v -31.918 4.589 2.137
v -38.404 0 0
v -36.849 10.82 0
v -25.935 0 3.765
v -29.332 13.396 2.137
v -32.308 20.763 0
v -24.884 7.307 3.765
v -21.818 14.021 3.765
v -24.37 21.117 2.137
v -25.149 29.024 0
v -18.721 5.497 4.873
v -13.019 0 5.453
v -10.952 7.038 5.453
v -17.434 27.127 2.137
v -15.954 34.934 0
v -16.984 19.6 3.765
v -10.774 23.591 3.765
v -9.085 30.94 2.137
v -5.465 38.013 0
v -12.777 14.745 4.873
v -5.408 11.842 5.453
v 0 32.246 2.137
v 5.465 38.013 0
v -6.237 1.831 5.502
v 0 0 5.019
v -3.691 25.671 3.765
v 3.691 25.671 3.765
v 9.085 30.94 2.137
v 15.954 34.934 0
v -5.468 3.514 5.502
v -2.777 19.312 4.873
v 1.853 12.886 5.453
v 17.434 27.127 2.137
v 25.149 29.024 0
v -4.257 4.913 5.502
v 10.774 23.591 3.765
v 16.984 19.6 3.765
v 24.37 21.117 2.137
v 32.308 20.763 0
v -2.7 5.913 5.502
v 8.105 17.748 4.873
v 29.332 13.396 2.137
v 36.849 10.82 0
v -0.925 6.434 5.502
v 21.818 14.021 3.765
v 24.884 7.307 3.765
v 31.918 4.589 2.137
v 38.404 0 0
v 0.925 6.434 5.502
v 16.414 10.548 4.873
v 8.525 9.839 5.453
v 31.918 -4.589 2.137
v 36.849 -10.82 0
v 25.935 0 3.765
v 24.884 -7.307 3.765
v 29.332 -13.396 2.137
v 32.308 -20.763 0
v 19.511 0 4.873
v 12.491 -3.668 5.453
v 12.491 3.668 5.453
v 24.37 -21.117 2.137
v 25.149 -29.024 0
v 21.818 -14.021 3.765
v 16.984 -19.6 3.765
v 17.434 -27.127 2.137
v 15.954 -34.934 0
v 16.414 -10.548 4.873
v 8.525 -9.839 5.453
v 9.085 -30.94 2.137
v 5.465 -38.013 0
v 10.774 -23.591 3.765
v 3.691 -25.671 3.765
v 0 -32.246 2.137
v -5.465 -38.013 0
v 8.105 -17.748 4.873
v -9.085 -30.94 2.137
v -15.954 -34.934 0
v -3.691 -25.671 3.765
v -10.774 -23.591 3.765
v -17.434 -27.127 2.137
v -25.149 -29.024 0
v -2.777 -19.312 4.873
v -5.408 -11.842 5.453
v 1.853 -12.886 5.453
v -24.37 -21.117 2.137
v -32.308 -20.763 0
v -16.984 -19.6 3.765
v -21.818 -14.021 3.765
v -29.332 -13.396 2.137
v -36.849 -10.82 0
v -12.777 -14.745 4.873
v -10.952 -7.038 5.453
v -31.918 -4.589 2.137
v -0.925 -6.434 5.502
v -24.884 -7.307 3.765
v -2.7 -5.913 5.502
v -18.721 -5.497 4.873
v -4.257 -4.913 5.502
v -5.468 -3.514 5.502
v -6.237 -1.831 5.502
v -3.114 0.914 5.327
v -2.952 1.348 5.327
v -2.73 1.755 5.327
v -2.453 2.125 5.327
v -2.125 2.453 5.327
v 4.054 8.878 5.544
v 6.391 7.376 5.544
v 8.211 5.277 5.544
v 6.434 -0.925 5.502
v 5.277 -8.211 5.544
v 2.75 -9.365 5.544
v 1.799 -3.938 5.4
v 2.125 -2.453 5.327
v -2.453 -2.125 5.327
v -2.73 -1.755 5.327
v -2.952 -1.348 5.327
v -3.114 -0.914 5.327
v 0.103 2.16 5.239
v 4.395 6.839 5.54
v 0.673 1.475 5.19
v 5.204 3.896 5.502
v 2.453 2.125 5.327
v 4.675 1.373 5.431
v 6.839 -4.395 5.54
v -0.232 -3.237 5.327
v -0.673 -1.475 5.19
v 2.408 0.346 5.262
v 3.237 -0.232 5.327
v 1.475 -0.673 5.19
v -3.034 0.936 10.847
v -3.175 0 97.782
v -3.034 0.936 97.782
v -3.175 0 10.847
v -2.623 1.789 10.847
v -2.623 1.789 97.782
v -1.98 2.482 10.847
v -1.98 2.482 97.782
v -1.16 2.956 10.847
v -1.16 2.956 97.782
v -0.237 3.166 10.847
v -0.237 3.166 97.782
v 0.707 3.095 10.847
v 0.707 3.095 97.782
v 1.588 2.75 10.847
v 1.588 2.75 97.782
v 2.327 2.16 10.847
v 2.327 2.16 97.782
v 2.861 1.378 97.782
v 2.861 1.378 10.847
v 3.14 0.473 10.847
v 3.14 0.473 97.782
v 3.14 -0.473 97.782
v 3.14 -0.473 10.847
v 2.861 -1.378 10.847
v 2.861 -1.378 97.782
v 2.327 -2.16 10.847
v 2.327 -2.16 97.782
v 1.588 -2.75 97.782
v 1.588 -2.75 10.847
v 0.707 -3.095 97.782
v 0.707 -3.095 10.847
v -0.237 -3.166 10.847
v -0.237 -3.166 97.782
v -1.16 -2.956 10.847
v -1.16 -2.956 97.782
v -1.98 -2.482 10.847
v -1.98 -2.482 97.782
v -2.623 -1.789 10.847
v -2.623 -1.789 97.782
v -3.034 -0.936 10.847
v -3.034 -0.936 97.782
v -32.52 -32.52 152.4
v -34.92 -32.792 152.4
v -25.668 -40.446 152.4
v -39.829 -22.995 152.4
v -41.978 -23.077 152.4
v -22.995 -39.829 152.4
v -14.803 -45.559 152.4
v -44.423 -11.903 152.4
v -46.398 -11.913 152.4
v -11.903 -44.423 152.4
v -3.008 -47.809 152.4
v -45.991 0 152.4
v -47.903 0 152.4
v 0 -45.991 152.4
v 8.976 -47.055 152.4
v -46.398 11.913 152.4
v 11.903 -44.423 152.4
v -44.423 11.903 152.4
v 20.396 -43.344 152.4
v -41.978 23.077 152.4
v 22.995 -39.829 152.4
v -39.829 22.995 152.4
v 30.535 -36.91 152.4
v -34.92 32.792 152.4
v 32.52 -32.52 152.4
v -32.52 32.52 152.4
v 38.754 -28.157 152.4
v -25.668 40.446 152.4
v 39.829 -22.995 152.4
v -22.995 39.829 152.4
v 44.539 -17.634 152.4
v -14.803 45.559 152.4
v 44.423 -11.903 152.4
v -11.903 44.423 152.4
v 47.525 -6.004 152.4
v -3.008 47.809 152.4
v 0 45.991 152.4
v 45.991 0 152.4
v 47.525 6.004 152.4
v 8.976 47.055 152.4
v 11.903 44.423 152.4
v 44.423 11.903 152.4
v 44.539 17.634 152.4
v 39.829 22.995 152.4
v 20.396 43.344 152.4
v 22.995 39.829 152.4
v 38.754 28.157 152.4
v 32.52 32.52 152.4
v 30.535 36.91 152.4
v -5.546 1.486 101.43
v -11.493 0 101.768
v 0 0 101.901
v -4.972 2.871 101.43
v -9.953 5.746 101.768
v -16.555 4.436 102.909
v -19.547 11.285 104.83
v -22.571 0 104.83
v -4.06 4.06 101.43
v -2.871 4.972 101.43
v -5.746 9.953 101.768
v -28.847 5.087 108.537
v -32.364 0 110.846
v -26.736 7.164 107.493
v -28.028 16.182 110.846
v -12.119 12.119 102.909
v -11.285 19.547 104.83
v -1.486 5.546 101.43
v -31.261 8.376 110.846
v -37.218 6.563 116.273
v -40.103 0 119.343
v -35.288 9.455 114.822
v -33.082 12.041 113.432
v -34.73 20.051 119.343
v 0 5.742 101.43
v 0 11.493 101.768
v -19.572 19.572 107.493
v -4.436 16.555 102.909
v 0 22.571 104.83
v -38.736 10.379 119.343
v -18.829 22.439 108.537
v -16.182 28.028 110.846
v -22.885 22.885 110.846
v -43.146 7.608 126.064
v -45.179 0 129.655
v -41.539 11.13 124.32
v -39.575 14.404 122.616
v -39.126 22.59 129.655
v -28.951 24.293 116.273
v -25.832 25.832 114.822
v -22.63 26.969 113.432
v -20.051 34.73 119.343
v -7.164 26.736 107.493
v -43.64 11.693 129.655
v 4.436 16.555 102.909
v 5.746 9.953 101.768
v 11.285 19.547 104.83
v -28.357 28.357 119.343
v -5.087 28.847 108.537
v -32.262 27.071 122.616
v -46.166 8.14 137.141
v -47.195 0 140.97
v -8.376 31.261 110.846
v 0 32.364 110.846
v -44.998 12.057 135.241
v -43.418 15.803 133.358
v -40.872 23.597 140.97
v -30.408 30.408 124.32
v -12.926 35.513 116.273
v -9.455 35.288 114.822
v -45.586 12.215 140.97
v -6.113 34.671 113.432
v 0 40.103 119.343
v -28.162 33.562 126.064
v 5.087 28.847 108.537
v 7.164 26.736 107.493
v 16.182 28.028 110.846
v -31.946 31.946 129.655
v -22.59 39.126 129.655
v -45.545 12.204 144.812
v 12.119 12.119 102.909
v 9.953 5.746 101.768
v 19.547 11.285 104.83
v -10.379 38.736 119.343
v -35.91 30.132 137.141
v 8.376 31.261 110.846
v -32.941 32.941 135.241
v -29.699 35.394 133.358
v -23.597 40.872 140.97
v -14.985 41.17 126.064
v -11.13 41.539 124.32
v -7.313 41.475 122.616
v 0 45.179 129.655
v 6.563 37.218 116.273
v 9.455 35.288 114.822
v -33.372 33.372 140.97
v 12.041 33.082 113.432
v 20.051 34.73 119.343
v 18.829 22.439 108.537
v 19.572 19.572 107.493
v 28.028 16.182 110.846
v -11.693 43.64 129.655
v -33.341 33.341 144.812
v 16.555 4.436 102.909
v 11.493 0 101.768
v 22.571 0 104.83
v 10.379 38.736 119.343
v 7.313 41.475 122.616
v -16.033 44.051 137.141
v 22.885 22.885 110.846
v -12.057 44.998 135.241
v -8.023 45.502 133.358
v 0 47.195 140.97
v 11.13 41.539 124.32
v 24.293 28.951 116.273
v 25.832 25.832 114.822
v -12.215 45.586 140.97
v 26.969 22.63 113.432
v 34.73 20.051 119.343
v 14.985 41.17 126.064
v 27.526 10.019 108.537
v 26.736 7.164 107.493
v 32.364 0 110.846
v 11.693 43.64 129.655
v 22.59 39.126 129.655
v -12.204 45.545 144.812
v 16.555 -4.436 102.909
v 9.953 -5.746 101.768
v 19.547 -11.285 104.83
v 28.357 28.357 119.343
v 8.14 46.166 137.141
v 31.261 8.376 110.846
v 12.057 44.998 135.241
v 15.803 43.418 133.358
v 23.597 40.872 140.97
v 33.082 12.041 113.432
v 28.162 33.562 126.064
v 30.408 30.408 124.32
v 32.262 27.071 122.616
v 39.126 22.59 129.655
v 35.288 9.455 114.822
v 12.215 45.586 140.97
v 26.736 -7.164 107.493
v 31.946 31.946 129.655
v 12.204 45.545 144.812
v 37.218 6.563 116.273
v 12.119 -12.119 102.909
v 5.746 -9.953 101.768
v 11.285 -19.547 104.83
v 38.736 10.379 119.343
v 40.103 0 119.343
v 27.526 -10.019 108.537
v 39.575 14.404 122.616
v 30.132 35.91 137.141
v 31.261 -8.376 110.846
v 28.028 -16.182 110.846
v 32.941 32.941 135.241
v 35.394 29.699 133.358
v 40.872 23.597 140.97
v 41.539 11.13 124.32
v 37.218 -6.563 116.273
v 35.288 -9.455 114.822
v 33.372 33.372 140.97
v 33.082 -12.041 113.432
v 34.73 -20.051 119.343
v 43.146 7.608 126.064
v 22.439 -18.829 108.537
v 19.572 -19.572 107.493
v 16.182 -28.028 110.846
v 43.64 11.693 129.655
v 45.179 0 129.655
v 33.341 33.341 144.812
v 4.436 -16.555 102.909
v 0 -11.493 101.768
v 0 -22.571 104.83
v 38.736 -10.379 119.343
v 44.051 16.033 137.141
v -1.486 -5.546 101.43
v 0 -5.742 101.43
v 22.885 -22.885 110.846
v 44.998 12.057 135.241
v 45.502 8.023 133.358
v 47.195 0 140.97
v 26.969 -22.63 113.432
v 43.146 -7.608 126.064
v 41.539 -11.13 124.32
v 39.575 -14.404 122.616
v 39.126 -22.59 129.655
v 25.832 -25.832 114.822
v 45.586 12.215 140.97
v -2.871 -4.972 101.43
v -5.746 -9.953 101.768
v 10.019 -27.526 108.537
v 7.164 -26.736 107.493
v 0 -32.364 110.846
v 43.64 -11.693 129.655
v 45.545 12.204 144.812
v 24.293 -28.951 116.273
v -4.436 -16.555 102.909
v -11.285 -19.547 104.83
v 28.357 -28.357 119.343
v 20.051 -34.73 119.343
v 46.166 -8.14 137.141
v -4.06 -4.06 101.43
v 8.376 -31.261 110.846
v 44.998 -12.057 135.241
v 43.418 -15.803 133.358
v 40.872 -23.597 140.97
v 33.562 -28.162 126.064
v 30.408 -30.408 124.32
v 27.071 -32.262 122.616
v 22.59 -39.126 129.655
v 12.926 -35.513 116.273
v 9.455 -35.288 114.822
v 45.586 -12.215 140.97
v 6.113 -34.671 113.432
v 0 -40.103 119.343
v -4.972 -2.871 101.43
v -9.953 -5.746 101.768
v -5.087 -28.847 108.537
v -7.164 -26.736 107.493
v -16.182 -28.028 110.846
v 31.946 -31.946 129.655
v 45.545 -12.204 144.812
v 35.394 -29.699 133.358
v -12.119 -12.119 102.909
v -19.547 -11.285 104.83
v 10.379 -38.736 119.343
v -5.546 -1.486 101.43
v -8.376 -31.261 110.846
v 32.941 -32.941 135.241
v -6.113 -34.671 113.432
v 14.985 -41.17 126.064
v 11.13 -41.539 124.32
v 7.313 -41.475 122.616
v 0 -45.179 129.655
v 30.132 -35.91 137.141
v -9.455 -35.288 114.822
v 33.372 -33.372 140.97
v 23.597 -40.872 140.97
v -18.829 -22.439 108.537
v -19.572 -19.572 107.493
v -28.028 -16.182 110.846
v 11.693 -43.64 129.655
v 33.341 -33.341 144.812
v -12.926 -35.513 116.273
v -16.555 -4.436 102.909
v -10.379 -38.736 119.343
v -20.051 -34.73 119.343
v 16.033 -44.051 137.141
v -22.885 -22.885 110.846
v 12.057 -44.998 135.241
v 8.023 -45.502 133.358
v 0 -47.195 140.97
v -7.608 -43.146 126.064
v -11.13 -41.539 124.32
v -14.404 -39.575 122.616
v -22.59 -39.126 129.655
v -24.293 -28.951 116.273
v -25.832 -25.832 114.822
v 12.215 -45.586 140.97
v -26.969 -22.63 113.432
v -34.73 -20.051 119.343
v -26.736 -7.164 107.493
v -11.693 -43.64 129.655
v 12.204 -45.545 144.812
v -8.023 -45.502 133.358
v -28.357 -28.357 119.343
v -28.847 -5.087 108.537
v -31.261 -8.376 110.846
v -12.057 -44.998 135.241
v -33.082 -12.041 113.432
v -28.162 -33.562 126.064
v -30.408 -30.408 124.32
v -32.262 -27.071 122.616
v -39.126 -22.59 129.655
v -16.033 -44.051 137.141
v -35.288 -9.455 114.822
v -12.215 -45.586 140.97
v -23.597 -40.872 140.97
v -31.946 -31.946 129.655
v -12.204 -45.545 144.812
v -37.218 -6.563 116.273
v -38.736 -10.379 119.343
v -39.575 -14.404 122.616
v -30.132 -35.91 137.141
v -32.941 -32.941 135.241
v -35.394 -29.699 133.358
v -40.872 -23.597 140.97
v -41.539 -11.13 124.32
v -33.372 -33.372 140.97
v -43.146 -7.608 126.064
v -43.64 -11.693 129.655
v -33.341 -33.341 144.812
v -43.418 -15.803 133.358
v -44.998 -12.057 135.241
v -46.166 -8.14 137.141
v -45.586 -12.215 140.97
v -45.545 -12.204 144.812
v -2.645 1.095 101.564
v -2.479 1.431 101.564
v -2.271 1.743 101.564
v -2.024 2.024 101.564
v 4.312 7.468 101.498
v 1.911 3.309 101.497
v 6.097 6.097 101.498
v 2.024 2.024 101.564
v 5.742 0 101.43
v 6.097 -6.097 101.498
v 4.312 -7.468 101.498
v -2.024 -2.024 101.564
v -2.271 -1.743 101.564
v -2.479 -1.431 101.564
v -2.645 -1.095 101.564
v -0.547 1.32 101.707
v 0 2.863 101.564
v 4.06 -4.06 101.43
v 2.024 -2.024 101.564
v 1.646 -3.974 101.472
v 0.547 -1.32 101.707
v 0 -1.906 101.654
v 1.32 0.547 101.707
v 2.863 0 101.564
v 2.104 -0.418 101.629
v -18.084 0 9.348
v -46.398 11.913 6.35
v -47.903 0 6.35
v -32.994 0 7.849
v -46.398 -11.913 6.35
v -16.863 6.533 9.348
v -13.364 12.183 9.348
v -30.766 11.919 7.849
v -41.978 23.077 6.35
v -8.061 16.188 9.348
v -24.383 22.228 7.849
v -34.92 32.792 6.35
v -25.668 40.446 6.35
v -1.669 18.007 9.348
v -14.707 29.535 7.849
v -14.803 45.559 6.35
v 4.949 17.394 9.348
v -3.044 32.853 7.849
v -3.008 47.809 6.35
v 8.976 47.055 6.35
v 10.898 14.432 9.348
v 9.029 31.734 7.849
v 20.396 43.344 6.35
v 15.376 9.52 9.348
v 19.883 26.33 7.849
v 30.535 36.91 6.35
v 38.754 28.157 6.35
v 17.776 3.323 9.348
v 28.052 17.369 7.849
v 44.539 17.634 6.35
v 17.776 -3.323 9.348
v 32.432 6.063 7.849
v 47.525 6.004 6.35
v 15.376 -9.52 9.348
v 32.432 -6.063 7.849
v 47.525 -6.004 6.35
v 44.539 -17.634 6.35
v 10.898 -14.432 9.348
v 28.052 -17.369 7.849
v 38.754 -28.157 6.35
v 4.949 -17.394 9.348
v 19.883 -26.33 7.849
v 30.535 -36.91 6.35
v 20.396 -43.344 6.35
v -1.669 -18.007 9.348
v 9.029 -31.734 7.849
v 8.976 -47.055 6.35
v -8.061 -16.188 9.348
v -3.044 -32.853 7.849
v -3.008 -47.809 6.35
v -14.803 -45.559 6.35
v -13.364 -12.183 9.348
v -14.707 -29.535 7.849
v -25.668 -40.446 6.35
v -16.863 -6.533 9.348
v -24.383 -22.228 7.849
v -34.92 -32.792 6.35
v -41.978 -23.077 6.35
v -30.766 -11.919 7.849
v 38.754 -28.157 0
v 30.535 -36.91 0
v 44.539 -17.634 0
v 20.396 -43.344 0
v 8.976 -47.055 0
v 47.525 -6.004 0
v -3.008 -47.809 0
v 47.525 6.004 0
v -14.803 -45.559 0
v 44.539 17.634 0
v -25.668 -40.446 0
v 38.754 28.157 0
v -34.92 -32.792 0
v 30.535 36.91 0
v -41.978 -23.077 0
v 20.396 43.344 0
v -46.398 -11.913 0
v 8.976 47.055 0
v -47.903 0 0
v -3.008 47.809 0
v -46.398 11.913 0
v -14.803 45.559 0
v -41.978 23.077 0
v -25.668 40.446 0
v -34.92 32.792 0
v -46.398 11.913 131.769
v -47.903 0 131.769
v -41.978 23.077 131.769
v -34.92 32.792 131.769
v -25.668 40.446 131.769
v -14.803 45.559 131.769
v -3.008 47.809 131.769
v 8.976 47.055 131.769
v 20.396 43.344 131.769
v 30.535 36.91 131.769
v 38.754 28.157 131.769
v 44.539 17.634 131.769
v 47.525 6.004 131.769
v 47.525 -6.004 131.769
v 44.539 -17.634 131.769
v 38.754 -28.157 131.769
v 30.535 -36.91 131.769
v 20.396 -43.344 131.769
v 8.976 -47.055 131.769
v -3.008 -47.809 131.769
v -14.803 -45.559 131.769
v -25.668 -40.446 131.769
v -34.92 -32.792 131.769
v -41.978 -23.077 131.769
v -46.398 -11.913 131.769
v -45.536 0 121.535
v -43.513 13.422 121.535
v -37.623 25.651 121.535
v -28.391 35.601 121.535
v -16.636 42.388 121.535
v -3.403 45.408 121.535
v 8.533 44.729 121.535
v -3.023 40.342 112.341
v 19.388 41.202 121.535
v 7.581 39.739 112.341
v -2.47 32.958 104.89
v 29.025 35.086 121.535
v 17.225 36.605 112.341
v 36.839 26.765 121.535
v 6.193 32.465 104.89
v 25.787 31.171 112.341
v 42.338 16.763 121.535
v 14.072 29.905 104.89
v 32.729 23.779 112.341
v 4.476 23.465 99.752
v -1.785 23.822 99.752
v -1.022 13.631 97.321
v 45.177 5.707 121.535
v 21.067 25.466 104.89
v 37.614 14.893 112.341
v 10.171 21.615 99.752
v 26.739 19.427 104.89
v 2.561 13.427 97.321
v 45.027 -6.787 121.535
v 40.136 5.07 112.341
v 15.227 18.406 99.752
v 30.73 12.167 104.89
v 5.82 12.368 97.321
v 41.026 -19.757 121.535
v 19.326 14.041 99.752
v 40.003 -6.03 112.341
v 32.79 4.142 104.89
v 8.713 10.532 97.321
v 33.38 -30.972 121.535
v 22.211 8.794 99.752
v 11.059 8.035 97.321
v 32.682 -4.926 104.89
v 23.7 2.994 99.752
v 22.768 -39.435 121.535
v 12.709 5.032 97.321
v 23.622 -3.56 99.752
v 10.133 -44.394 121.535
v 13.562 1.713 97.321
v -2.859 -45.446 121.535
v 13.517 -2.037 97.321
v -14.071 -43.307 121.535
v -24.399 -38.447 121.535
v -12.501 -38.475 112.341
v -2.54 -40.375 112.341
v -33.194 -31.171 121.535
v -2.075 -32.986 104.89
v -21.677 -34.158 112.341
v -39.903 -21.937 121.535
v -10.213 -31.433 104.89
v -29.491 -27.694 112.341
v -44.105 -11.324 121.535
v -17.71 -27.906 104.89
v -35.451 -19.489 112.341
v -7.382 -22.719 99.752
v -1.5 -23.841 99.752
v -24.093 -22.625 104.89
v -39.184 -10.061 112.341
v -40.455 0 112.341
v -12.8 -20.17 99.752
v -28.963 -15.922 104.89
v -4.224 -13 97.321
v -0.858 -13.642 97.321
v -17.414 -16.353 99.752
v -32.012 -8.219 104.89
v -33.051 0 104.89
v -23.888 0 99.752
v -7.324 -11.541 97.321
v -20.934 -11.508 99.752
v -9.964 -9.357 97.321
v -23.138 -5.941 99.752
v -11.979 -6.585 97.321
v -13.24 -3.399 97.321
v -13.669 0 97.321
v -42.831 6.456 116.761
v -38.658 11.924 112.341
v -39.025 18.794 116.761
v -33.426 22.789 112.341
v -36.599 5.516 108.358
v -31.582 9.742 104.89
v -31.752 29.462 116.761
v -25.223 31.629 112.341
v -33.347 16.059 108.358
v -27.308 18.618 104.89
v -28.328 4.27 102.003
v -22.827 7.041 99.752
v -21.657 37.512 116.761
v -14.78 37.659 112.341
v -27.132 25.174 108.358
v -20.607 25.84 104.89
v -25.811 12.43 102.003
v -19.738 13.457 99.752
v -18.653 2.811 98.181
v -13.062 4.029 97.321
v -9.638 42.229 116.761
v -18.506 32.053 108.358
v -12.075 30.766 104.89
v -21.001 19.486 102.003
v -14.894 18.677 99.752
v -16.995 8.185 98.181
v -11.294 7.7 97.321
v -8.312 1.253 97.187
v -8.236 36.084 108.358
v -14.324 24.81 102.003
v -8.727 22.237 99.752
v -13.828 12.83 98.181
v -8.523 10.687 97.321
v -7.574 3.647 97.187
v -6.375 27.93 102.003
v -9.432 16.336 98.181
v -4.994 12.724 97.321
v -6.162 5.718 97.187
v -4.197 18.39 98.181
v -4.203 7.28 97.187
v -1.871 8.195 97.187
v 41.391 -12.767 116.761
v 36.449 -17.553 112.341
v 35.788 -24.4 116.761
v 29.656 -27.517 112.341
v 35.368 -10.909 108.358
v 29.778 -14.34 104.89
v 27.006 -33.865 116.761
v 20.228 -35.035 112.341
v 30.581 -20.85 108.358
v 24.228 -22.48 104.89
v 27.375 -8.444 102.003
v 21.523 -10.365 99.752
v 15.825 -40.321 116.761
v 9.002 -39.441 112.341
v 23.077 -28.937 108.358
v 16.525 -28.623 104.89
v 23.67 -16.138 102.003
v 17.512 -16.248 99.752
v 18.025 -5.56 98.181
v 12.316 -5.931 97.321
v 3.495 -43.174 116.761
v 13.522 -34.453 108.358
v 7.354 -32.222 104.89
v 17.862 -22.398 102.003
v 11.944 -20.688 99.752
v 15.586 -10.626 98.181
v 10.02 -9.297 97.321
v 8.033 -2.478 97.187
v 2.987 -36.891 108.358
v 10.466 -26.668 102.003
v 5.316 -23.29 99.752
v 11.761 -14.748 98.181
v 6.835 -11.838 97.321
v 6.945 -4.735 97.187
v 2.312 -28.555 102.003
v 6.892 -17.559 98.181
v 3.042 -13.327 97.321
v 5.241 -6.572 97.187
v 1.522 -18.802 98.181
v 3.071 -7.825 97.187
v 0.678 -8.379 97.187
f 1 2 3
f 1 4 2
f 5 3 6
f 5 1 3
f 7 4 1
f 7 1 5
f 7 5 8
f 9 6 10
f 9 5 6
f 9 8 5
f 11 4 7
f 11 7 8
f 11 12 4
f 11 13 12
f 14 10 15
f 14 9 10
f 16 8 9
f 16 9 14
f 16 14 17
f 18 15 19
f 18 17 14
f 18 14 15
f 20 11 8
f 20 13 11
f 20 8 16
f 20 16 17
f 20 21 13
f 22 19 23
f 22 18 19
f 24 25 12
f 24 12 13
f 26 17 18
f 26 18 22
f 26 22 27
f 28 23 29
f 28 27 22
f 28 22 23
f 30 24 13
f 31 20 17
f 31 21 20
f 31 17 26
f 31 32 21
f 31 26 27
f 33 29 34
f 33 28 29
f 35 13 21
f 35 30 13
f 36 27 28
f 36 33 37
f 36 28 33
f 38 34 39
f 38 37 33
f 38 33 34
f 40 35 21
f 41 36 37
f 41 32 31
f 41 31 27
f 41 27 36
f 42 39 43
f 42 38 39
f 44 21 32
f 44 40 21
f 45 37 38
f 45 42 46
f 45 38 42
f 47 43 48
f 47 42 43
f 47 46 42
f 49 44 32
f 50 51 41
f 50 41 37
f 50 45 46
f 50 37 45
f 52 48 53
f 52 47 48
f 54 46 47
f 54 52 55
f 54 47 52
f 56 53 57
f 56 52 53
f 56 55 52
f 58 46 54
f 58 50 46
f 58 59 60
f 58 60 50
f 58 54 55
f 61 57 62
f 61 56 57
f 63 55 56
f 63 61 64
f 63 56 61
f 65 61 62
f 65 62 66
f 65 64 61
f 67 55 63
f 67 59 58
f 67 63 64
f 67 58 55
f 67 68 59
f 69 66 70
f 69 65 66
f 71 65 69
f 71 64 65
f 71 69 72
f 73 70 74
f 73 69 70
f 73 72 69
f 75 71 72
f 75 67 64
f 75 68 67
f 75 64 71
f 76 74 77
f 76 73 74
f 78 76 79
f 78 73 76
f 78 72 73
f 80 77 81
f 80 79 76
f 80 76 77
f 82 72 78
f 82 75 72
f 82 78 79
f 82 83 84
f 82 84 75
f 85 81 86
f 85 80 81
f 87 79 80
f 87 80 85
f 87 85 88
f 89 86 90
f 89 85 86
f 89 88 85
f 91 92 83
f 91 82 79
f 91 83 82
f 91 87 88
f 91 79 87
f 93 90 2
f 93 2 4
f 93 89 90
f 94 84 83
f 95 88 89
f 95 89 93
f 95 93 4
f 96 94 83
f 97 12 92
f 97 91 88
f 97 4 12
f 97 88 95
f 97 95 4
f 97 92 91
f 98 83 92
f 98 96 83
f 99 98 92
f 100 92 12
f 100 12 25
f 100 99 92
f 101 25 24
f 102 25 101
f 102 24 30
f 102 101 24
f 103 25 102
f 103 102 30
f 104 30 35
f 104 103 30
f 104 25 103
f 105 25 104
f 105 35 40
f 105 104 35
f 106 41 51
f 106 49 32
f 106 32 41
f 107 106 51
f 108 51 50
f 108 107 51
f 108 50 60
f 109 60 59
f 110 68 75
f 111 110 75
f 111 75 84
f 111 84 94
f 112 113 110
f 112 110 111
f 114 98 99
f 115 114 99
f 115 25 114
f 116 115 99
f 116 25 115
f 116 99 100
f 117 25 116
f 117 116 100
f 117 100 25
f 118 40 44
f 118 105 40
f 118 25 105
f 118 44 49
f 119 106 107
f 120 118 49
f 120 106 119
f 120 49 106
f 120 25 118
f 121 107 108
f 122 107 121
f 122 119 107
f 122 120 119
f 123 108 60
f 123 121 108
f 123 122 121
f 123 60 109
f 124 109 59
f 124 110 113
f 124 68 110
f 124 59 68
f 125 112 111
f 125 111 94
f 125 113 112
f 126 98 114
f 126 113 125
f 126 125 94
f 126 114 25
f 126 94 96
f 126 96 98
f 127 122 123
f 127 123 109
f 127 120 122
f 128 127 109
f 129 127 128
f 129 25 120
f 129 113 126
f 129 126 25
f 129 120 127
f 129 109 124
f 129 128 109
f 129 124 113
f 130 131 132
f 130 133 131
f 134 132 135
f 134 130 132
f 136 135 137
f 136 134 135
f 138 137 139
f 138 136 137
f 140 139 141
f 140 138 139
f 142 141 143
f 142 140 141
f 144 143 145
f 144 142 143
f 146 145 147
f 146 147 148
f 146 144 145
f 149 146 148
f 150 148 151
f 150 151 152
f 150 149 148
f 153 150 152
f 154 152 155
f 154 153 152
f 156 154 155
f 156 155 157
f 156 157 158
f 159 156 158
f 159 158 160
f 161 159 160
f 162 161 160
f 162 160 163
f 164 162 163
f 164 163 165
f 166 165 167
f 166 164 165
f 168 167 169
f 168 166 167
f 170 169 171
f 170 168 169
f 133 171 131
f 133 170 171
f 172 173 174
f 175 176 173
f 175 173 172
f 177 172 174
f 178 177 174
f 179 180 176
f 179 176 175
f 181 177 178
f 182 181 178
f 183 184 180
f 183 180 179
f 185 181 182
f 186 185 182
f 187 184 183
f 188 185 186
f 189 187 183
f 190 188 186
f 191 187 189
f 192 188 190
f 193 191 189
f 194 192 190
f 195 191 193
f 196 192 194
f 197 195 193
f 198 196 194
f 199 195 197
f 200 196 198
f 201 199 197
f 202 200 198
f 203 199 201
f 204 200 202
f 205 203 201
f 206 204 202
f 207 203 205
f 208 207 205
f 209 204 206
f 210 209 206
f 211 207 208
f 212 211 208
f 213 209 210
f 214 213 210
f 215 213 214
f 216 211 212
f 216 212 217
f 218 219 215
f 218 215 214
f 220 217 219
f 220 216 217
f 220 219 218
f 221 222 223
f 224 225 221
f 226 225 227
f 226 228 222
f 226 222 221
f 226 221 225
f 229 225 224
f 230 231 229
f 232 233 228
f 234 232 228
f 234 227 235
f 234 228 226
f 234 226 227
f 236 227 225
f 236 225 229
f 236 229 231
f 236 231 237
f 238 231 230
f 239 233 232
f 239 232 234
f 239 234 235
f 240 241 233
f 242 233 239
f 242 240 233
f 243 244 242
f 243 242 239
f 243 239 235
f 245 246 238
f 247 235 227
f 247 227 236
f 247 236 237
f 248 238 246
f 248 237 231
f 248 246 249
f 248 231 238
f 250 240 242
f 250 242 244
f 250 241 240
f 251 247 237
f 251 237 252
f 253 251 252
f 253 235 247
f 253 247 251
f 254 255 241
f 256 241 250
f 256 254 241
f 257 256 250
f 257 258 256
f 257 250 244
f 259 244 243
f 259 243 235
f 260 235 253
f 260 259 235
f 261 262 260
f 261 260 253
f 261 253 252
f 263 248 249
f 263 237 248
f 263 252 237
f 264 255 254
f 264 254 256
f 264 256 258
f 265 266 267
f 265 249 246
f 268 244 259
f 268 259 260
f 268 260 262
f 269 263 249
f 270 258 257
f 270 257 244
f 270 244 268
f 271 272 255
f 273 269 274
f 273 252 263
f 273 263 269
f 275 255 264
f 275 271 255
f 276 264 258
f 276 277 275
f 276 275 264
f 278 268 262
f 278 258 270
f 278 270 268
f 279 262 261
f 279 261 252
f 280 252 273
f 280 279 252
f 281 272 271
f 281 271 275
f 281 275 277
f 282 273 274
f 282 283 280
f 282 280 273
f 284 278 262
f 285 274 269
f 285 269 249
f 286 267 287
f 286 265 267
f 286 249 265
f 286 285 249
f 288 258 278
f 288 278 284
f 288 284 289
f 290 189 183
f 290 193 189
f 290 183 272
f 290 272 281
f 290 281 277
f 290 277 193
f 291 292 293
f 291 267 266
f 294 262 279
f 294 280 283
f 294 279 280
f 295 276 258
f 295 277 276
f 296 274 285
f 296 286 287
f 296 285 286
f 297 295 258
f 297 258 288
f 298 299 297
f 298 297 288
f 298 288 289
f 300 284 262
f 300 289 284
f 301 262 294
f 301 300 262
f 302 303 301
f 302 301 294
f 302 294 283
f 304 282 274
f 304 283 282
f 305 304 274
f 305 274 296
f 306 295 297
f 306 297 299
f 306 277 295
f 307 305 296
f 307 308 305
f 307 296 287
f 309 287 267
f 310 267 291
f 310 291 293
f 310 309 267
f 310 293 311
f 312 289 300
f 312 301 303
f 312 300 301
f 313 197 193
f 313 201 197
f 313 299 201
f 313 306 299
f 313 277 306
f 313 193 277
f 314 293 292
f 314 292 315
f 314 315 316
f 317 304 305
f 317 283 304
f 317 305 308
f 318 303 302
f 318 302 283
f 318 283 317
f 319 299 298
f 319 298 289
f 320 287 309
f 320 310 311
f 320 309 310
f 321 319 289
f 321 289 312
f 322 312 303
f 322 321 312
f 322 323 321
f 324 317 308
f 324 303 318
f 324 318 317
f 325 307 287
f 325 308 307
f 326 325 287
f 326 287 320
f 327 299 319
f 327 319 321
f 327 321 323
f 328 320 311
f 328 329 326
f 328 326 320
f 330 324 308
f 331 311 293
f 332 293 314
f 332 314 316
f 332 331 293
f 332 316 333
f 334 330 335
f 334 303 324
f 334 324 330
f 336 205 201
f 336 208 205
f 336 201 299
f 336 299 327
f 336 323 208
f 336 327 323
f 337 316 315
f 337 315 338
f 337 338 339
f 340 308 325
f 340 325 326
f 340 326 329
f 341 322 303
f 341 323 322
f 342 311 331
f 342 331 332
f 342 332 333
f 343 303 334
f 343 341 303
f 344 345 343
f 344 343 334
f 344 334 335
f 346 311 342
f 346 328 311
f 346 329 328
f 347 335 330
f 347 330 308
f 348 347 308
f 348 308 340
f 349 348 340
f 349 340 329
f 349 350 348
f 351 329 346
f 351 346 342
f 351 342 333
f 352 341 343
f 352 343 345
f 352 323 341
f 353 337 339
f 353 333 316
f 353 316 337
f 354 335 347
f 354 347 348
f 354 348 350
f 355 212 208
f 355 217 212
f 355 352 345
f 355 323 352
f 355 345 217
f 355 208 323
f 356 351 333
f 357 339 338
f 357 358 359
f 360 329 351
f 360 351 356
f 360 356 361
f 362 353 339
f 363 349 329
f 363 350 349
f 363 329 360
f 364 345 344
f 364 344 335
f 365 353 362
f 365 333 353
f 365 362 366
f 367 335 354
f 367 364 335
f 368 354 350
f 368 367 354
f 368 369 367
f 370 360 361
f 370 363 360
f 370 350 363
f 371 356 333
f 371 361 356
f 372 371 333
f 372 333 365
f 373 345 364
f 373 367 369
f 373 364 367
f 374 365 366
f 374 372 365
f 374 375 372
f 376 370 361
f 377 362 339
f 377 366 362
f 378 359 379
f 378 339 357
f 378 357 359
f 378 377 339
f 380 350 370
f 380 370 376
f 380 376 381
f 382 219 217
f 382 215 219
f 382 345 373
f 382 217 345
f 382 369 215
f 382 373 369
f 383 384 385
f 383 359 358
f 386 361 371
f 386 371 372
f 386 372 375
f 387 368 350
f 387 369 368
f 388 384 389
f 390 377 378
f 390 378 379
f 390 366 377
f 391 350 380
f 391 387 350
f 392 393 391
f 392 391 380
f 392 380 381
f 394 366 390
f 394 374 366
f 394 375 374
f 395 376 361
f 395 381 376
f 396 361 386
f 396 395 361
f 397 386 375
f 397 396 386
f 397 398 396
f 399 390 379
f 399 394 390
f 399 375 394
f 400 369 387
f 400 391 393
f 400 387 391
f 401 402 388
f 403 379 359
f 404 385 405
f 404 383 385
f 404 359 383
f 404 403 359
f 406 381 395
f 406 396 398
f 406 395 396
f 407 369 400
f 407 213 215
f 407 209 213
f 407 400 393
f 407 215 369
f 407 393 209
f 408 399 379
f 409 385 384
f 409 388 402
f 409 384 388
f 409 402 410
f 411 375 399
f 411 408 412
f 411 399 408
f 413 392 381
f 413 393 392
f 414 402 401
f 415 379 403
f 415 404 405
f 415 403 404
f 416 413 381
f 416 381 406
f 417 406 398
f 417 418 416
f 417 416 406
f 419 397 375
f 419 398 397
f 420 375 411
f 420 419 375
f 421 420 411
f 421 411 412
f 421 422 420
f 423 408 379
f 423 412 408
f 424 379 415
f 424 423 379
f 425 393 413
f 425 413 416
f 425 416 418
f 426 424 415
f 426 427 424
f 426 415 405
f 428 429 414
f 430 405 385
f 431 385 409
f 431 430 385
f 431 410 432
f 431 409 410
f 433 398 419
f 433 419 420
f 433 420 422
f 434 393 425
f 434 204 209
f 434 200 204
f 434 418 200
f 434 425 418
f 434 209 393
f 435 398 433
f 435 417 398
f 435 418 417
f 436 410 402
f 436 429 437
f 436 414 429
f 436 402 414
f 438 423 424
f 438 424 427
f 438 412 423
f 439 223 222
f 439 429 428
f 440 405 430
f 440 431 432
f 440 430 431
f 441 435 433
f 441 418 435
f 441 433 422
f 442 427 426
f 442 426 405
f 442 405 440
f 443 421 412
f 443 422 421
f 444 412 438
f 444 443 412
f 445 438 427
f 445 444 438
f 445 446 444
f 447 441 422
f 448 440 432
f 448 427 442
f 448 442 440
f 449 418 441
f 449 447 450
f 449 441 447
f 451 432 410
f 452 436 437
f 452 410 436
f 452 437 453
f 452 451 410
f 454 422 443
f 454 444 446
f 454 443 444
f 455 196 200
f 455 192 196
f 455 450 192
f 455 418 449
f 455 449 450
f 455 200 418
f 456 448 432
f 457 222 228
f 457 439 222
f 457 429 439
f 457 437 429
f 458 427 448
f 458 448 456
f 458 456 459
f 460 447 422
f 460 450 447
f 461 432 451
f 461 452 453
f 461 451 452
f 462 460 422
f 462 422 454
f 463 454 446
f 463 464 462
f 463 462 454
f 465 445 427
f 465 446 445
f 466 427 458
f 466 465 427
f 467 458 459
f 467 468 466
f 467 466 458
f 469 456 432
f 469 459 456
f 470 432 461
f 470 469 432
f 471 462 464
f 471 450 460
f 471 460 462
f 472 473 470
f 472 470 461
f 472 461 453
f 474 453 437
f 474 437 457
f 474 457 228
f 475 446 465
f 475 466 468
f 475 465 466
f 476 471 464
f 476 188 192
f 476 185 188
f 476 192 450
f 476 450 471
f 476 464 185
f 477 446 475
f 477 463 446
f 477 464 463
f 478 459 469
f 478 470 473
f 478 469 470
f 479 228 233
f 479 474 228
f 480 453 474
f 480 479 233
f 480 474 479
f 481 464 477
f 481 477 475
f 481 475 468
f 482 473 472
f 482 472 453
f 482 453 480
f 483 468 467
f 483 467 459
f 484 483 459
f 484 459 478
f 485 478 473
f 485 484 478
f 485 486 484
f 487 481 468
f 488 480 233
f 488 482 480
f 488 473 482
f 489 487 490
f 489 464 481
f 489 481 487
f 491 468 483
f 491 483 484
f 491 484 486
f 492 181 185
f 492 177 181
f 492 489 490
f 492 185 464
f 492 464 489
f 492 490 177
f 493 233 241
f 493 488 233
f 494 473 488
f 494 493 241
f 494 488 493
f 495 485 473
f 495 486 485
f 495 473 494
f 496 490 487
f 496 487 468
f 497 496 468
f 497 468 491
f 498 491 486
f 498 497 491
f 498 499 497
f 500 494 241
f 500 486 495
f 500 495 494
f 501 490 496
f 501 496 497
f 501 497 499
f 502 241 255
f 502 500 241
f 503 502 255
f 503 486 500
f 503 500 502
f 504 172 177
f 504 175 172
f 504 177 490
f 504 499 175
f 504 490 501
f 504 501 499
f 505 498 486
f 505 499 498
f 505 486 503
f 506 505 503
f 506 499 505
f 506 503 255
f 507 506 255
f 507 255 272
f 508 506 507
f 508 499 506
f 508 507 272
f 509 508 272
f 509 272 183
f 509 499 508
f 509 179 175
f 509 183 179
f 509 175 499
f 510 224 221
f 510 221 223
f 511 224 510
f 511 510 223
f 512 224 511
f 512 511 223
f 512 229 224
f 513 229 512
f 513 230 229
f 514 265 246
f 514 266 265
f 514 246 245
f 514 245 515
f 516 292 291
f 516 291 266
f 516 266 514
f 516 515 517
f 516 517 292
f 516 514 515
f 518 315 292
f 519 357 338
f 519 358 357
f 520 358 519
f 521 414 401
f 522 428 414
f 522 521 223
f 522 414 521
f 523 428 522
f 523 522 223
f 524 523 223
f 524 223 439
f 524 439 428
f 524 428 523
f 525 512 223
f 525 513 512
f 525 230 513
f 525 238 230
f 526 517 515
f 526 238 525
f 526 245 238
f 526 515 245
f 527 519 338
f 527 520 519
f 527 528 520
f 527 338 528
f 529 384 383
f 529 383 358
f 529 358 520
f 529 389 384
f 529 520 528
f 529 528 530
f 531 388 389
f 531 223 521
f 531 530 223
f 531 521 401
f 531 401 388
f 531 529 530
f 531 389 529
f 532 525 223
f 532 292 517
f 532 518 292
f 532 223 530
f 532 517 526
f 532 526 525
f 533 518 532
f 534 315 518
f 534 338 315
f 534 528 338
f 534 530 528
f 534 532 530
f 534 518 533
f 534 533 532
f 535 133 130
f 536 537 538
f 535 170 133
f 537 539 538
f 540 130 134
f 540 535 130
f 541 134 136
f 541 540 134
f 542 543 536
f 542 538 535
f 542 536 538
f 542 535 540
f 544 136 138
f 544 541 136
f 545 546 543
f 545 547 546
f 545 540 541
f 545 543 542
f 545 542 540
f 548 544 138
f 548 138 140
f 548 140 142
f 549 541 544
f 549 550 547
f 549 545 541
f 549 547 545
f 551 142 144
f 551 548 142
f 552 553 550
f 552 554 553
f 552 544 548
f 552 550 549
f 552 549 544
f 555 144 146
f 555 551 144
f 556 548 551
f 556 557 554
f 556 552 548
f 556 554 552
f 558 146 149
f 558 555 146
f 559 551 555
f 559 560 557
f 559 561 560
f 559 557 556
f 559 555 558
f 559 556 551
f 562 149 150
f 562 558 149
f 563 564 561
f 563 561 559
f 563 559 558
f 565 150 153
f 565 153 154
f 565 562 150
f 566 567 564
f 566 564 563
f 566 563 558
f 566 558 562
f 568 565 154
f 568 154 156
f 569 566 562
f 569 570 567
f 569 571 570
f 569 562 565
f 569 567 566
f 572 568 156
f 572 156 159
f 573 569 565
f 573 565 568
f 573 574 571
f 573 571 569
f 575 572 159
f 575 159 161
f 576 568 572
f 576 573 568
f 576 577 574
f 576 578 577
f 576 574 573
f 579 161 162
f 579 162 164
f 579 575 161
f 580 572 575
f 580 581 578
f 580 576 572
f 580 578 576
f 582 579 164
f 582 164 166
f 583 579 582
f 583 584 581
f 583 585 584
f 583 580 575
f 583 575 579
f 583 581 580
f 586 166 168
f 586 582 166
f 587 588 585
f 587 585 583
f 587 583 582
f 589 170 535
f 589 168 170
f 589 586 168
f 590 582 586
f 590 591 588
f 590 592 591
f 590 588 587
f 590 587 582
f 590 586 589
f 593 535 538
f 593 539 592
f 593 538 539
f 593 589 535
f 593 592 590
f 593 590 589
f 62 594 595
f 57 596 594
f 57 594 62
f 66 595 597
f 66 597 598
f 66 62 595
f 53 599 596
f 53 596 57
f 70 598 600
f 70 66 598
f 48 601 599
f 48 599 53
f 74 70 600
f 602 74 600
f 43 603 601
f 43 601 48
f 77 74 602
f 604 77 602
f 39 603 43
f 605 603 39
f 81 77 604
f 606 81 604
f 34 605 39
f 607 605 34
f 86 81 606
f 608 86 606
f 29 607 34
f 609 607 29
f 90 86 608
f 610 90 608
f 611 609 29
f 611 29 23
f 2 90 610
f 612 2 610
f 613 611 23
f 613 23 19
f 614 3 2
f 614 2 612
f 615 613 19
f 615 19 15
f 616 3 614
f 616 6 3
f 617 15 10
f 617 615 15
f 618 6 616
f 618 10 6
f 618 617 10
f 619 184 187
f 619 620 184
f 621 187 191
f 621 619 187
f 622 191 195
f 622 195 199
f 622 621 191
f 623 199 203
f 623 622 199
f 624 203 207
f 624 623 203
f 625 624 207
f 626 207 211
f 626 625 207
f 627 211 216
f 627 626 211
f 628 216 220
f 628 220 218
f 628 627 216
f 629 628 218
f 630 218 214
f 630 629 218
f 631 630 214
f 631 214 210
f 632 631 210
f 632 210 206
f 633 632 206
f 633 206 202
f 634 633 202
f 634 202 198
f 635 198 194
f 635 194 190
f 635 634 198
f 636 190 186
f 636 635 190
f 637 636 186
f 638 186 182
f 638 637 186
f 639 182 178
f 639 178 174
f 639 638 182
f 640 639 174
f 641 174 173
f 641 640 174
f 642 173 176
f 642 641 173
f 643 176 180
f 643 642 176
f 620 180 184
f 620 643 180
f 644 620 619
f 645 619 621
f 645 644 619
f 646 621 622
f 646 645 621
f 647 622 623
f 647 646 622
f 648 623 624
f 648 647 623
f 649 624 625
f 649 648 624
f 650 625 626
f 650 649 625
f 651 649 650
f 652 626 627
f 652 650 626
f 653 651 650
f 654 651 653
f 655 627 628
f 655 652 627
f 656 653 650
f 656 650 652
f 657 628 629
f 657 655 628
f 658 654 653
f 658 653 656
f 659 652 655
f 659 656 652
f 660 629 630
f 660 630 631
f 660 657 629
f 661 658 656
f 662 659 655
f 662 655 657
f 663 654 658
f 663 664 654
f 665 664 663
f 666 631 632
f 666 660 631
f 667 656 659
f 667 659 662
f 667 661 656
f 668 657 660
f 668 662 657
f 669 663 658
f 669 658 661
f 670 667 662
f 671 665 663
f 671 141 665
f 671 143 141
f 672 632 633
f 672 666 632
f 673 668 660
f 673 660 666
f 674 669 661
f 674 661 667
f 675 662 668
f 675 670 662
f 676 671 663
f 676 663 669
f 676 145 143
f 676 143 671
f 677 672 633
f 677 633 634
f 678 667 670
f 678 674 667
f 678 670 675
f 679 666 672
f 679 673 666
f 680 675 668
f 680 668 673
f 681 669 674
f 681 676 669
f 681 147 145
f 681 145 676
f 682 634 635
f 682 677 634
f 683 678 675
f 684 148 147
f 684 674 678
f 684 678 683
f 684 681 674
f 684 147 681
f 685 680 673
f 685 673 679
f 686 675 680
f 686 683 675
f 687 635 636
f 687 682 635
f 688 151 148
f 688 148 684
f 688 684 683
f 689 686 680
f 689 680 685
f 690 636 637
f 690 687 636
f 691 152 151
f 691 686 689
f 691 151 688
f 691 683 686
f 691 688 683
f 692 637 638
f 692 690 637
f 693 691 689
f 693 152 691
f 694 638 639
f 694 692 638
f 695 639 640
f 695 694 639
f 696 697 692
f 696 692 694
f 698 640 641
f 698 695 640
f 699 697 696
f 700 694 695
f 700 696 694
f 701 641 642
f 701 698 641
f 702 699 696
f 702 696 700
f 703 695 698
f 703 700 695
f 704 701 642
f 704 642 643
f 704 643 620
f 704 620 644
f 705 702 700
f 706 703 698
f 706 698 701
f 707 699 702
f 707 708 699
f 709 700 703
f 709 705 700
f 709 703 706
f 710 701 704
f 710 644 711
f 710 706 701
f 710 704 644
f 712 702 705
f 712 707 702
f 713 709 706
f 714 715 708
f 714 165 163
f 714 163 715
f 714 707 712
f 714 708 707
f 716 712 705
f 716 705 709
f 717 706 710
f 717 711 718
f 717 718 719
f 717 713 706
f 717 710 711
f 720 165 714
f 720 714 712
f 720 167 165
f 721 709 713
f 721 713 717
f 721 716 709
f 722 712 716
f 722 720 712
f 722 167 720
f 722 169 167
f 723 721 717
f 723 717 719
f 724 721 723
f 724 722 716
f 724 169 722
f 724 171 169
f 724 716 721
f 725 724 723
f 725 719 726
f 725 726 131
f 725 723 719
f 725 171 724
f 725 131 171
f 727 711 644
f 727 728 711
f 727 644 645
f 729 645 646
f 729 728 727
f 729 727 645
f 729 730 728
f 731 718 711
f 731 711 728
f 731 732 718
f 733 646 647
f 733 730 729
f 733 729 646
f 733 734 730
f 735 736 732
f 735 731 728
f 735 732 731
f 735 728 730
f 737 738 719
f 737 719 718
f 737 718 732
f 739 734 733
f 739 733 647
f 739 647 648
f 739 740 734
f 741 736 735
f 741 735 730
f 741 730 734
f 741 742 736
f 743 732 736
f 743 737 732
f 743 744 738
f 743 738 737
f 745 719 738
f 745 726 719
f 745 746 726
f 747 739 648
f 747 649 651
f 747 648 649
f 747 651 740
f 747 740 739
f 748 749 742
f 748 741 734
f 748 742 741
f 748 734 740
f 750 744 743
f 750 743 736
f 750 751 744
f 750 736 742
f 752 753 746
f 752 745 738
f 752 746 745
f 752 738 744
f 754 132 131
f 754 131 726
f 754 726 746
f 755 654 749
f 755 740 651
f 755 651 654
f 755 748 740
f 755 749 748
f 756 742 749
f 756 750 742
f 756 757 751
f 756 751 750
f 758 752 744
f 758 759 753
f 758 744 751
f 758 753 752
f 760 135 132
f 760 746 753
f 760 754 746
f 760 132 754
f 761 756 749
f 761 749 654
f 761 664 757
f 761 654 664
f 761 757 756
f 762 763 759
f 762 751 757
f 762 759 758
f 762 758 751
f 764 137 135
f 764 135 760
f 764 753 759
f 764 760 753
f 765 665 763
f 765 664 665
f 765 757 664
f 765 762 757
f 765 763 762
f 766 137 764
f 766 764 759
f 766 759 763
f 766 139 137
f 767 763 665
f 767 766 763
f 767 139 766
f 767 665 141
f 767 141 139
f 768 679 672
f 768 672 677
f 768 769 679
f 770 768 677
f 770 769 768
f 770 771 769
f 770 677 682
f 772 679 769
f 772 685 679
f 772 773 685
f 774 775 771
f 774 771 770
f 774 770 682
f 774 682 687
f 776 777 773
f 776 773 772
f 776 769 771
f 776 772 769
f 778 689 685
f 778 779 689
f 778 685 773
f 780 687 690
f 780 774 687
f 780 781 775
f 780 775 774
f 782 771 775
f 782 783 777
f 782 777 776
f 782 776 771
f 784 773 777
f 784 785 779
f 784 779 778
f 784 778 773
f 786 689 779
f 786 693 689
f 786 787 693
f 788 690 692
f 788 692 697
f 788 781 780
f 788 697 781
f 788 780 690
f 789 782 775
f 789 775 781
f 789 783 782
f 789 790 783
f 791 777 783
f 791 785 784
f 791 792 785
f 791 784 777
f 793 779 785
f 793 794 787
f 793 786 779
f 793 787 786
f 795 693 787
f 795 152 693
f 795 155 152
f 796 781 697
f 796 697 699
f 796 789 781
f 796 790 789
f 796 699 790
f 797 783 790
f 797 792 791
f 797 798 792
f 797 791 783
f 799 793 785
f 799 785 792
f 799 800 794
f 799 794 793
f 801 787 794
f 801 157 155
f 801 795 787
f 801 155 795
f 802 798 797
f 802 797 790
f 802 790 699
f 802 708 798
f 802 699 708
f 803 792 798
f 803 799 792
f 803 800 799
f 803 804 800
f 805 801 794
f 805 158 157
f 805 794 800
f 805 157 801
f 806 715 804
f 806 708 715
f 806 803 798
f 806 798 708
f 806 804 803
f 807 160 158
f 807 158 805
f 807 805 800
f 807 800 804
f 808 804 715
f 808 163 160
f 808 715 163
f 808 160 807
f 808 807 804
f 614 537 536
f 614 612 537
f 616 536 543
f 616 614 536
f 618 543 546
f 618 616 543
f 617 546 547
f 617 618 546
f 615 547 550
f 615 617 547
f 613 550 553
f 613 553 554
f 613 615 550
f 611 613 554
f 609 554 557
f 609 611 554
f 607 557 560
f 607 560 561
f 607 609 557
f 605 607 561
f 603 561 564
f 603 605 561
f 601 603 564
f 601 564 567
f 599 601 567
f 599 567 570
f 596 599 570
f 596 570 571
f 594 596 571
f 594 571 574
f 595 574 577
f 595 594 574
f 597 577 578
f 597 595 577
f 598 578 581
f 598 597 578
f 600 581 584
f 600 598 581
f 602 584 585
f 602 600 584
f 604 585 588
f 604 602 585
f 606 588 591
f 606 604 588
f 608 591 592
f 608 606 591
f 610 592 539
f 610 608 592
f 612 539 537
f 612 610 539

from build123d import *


with BuildPart() as f1:
    # F0 (on Front) → F1 (revolve)
    with BuildSketch(Plane.XZ):
        with BuildLine():
            Line((-47.903051, 0), (-38.404208, 0))
            ThreePointArc((-38.404208, 0), (-19.511023, 4.873279), (0, 5.019141))
            Line((0, 5.019141), (0, 101.9006))
            ThreePointArc((0, 101.9006), (-36.532312, 114.821918), (-45.990533, 152.4))
            Line((-45.990533, 152.4), (-47.903051, 152.4))
            Line((-47.903051, 152.4), (-47.903051, 131.76902))
            ThreePointArc((-47.903051, 131.76902), (-33.050799, 104.889711), (-3.175, 97.781743))
            Line((-3.175, 97.781743), (-3.175, 10.84711))
            Line((-3.175, 10.84711), (-47.903051, 6.35))
            Line((-47.903051, 6.35), (-47.903051, 0))
        make_face()
    revolve(axis=Axis((0, 0, 53.459871), (0, 0, -1)))


solid = f1.part
